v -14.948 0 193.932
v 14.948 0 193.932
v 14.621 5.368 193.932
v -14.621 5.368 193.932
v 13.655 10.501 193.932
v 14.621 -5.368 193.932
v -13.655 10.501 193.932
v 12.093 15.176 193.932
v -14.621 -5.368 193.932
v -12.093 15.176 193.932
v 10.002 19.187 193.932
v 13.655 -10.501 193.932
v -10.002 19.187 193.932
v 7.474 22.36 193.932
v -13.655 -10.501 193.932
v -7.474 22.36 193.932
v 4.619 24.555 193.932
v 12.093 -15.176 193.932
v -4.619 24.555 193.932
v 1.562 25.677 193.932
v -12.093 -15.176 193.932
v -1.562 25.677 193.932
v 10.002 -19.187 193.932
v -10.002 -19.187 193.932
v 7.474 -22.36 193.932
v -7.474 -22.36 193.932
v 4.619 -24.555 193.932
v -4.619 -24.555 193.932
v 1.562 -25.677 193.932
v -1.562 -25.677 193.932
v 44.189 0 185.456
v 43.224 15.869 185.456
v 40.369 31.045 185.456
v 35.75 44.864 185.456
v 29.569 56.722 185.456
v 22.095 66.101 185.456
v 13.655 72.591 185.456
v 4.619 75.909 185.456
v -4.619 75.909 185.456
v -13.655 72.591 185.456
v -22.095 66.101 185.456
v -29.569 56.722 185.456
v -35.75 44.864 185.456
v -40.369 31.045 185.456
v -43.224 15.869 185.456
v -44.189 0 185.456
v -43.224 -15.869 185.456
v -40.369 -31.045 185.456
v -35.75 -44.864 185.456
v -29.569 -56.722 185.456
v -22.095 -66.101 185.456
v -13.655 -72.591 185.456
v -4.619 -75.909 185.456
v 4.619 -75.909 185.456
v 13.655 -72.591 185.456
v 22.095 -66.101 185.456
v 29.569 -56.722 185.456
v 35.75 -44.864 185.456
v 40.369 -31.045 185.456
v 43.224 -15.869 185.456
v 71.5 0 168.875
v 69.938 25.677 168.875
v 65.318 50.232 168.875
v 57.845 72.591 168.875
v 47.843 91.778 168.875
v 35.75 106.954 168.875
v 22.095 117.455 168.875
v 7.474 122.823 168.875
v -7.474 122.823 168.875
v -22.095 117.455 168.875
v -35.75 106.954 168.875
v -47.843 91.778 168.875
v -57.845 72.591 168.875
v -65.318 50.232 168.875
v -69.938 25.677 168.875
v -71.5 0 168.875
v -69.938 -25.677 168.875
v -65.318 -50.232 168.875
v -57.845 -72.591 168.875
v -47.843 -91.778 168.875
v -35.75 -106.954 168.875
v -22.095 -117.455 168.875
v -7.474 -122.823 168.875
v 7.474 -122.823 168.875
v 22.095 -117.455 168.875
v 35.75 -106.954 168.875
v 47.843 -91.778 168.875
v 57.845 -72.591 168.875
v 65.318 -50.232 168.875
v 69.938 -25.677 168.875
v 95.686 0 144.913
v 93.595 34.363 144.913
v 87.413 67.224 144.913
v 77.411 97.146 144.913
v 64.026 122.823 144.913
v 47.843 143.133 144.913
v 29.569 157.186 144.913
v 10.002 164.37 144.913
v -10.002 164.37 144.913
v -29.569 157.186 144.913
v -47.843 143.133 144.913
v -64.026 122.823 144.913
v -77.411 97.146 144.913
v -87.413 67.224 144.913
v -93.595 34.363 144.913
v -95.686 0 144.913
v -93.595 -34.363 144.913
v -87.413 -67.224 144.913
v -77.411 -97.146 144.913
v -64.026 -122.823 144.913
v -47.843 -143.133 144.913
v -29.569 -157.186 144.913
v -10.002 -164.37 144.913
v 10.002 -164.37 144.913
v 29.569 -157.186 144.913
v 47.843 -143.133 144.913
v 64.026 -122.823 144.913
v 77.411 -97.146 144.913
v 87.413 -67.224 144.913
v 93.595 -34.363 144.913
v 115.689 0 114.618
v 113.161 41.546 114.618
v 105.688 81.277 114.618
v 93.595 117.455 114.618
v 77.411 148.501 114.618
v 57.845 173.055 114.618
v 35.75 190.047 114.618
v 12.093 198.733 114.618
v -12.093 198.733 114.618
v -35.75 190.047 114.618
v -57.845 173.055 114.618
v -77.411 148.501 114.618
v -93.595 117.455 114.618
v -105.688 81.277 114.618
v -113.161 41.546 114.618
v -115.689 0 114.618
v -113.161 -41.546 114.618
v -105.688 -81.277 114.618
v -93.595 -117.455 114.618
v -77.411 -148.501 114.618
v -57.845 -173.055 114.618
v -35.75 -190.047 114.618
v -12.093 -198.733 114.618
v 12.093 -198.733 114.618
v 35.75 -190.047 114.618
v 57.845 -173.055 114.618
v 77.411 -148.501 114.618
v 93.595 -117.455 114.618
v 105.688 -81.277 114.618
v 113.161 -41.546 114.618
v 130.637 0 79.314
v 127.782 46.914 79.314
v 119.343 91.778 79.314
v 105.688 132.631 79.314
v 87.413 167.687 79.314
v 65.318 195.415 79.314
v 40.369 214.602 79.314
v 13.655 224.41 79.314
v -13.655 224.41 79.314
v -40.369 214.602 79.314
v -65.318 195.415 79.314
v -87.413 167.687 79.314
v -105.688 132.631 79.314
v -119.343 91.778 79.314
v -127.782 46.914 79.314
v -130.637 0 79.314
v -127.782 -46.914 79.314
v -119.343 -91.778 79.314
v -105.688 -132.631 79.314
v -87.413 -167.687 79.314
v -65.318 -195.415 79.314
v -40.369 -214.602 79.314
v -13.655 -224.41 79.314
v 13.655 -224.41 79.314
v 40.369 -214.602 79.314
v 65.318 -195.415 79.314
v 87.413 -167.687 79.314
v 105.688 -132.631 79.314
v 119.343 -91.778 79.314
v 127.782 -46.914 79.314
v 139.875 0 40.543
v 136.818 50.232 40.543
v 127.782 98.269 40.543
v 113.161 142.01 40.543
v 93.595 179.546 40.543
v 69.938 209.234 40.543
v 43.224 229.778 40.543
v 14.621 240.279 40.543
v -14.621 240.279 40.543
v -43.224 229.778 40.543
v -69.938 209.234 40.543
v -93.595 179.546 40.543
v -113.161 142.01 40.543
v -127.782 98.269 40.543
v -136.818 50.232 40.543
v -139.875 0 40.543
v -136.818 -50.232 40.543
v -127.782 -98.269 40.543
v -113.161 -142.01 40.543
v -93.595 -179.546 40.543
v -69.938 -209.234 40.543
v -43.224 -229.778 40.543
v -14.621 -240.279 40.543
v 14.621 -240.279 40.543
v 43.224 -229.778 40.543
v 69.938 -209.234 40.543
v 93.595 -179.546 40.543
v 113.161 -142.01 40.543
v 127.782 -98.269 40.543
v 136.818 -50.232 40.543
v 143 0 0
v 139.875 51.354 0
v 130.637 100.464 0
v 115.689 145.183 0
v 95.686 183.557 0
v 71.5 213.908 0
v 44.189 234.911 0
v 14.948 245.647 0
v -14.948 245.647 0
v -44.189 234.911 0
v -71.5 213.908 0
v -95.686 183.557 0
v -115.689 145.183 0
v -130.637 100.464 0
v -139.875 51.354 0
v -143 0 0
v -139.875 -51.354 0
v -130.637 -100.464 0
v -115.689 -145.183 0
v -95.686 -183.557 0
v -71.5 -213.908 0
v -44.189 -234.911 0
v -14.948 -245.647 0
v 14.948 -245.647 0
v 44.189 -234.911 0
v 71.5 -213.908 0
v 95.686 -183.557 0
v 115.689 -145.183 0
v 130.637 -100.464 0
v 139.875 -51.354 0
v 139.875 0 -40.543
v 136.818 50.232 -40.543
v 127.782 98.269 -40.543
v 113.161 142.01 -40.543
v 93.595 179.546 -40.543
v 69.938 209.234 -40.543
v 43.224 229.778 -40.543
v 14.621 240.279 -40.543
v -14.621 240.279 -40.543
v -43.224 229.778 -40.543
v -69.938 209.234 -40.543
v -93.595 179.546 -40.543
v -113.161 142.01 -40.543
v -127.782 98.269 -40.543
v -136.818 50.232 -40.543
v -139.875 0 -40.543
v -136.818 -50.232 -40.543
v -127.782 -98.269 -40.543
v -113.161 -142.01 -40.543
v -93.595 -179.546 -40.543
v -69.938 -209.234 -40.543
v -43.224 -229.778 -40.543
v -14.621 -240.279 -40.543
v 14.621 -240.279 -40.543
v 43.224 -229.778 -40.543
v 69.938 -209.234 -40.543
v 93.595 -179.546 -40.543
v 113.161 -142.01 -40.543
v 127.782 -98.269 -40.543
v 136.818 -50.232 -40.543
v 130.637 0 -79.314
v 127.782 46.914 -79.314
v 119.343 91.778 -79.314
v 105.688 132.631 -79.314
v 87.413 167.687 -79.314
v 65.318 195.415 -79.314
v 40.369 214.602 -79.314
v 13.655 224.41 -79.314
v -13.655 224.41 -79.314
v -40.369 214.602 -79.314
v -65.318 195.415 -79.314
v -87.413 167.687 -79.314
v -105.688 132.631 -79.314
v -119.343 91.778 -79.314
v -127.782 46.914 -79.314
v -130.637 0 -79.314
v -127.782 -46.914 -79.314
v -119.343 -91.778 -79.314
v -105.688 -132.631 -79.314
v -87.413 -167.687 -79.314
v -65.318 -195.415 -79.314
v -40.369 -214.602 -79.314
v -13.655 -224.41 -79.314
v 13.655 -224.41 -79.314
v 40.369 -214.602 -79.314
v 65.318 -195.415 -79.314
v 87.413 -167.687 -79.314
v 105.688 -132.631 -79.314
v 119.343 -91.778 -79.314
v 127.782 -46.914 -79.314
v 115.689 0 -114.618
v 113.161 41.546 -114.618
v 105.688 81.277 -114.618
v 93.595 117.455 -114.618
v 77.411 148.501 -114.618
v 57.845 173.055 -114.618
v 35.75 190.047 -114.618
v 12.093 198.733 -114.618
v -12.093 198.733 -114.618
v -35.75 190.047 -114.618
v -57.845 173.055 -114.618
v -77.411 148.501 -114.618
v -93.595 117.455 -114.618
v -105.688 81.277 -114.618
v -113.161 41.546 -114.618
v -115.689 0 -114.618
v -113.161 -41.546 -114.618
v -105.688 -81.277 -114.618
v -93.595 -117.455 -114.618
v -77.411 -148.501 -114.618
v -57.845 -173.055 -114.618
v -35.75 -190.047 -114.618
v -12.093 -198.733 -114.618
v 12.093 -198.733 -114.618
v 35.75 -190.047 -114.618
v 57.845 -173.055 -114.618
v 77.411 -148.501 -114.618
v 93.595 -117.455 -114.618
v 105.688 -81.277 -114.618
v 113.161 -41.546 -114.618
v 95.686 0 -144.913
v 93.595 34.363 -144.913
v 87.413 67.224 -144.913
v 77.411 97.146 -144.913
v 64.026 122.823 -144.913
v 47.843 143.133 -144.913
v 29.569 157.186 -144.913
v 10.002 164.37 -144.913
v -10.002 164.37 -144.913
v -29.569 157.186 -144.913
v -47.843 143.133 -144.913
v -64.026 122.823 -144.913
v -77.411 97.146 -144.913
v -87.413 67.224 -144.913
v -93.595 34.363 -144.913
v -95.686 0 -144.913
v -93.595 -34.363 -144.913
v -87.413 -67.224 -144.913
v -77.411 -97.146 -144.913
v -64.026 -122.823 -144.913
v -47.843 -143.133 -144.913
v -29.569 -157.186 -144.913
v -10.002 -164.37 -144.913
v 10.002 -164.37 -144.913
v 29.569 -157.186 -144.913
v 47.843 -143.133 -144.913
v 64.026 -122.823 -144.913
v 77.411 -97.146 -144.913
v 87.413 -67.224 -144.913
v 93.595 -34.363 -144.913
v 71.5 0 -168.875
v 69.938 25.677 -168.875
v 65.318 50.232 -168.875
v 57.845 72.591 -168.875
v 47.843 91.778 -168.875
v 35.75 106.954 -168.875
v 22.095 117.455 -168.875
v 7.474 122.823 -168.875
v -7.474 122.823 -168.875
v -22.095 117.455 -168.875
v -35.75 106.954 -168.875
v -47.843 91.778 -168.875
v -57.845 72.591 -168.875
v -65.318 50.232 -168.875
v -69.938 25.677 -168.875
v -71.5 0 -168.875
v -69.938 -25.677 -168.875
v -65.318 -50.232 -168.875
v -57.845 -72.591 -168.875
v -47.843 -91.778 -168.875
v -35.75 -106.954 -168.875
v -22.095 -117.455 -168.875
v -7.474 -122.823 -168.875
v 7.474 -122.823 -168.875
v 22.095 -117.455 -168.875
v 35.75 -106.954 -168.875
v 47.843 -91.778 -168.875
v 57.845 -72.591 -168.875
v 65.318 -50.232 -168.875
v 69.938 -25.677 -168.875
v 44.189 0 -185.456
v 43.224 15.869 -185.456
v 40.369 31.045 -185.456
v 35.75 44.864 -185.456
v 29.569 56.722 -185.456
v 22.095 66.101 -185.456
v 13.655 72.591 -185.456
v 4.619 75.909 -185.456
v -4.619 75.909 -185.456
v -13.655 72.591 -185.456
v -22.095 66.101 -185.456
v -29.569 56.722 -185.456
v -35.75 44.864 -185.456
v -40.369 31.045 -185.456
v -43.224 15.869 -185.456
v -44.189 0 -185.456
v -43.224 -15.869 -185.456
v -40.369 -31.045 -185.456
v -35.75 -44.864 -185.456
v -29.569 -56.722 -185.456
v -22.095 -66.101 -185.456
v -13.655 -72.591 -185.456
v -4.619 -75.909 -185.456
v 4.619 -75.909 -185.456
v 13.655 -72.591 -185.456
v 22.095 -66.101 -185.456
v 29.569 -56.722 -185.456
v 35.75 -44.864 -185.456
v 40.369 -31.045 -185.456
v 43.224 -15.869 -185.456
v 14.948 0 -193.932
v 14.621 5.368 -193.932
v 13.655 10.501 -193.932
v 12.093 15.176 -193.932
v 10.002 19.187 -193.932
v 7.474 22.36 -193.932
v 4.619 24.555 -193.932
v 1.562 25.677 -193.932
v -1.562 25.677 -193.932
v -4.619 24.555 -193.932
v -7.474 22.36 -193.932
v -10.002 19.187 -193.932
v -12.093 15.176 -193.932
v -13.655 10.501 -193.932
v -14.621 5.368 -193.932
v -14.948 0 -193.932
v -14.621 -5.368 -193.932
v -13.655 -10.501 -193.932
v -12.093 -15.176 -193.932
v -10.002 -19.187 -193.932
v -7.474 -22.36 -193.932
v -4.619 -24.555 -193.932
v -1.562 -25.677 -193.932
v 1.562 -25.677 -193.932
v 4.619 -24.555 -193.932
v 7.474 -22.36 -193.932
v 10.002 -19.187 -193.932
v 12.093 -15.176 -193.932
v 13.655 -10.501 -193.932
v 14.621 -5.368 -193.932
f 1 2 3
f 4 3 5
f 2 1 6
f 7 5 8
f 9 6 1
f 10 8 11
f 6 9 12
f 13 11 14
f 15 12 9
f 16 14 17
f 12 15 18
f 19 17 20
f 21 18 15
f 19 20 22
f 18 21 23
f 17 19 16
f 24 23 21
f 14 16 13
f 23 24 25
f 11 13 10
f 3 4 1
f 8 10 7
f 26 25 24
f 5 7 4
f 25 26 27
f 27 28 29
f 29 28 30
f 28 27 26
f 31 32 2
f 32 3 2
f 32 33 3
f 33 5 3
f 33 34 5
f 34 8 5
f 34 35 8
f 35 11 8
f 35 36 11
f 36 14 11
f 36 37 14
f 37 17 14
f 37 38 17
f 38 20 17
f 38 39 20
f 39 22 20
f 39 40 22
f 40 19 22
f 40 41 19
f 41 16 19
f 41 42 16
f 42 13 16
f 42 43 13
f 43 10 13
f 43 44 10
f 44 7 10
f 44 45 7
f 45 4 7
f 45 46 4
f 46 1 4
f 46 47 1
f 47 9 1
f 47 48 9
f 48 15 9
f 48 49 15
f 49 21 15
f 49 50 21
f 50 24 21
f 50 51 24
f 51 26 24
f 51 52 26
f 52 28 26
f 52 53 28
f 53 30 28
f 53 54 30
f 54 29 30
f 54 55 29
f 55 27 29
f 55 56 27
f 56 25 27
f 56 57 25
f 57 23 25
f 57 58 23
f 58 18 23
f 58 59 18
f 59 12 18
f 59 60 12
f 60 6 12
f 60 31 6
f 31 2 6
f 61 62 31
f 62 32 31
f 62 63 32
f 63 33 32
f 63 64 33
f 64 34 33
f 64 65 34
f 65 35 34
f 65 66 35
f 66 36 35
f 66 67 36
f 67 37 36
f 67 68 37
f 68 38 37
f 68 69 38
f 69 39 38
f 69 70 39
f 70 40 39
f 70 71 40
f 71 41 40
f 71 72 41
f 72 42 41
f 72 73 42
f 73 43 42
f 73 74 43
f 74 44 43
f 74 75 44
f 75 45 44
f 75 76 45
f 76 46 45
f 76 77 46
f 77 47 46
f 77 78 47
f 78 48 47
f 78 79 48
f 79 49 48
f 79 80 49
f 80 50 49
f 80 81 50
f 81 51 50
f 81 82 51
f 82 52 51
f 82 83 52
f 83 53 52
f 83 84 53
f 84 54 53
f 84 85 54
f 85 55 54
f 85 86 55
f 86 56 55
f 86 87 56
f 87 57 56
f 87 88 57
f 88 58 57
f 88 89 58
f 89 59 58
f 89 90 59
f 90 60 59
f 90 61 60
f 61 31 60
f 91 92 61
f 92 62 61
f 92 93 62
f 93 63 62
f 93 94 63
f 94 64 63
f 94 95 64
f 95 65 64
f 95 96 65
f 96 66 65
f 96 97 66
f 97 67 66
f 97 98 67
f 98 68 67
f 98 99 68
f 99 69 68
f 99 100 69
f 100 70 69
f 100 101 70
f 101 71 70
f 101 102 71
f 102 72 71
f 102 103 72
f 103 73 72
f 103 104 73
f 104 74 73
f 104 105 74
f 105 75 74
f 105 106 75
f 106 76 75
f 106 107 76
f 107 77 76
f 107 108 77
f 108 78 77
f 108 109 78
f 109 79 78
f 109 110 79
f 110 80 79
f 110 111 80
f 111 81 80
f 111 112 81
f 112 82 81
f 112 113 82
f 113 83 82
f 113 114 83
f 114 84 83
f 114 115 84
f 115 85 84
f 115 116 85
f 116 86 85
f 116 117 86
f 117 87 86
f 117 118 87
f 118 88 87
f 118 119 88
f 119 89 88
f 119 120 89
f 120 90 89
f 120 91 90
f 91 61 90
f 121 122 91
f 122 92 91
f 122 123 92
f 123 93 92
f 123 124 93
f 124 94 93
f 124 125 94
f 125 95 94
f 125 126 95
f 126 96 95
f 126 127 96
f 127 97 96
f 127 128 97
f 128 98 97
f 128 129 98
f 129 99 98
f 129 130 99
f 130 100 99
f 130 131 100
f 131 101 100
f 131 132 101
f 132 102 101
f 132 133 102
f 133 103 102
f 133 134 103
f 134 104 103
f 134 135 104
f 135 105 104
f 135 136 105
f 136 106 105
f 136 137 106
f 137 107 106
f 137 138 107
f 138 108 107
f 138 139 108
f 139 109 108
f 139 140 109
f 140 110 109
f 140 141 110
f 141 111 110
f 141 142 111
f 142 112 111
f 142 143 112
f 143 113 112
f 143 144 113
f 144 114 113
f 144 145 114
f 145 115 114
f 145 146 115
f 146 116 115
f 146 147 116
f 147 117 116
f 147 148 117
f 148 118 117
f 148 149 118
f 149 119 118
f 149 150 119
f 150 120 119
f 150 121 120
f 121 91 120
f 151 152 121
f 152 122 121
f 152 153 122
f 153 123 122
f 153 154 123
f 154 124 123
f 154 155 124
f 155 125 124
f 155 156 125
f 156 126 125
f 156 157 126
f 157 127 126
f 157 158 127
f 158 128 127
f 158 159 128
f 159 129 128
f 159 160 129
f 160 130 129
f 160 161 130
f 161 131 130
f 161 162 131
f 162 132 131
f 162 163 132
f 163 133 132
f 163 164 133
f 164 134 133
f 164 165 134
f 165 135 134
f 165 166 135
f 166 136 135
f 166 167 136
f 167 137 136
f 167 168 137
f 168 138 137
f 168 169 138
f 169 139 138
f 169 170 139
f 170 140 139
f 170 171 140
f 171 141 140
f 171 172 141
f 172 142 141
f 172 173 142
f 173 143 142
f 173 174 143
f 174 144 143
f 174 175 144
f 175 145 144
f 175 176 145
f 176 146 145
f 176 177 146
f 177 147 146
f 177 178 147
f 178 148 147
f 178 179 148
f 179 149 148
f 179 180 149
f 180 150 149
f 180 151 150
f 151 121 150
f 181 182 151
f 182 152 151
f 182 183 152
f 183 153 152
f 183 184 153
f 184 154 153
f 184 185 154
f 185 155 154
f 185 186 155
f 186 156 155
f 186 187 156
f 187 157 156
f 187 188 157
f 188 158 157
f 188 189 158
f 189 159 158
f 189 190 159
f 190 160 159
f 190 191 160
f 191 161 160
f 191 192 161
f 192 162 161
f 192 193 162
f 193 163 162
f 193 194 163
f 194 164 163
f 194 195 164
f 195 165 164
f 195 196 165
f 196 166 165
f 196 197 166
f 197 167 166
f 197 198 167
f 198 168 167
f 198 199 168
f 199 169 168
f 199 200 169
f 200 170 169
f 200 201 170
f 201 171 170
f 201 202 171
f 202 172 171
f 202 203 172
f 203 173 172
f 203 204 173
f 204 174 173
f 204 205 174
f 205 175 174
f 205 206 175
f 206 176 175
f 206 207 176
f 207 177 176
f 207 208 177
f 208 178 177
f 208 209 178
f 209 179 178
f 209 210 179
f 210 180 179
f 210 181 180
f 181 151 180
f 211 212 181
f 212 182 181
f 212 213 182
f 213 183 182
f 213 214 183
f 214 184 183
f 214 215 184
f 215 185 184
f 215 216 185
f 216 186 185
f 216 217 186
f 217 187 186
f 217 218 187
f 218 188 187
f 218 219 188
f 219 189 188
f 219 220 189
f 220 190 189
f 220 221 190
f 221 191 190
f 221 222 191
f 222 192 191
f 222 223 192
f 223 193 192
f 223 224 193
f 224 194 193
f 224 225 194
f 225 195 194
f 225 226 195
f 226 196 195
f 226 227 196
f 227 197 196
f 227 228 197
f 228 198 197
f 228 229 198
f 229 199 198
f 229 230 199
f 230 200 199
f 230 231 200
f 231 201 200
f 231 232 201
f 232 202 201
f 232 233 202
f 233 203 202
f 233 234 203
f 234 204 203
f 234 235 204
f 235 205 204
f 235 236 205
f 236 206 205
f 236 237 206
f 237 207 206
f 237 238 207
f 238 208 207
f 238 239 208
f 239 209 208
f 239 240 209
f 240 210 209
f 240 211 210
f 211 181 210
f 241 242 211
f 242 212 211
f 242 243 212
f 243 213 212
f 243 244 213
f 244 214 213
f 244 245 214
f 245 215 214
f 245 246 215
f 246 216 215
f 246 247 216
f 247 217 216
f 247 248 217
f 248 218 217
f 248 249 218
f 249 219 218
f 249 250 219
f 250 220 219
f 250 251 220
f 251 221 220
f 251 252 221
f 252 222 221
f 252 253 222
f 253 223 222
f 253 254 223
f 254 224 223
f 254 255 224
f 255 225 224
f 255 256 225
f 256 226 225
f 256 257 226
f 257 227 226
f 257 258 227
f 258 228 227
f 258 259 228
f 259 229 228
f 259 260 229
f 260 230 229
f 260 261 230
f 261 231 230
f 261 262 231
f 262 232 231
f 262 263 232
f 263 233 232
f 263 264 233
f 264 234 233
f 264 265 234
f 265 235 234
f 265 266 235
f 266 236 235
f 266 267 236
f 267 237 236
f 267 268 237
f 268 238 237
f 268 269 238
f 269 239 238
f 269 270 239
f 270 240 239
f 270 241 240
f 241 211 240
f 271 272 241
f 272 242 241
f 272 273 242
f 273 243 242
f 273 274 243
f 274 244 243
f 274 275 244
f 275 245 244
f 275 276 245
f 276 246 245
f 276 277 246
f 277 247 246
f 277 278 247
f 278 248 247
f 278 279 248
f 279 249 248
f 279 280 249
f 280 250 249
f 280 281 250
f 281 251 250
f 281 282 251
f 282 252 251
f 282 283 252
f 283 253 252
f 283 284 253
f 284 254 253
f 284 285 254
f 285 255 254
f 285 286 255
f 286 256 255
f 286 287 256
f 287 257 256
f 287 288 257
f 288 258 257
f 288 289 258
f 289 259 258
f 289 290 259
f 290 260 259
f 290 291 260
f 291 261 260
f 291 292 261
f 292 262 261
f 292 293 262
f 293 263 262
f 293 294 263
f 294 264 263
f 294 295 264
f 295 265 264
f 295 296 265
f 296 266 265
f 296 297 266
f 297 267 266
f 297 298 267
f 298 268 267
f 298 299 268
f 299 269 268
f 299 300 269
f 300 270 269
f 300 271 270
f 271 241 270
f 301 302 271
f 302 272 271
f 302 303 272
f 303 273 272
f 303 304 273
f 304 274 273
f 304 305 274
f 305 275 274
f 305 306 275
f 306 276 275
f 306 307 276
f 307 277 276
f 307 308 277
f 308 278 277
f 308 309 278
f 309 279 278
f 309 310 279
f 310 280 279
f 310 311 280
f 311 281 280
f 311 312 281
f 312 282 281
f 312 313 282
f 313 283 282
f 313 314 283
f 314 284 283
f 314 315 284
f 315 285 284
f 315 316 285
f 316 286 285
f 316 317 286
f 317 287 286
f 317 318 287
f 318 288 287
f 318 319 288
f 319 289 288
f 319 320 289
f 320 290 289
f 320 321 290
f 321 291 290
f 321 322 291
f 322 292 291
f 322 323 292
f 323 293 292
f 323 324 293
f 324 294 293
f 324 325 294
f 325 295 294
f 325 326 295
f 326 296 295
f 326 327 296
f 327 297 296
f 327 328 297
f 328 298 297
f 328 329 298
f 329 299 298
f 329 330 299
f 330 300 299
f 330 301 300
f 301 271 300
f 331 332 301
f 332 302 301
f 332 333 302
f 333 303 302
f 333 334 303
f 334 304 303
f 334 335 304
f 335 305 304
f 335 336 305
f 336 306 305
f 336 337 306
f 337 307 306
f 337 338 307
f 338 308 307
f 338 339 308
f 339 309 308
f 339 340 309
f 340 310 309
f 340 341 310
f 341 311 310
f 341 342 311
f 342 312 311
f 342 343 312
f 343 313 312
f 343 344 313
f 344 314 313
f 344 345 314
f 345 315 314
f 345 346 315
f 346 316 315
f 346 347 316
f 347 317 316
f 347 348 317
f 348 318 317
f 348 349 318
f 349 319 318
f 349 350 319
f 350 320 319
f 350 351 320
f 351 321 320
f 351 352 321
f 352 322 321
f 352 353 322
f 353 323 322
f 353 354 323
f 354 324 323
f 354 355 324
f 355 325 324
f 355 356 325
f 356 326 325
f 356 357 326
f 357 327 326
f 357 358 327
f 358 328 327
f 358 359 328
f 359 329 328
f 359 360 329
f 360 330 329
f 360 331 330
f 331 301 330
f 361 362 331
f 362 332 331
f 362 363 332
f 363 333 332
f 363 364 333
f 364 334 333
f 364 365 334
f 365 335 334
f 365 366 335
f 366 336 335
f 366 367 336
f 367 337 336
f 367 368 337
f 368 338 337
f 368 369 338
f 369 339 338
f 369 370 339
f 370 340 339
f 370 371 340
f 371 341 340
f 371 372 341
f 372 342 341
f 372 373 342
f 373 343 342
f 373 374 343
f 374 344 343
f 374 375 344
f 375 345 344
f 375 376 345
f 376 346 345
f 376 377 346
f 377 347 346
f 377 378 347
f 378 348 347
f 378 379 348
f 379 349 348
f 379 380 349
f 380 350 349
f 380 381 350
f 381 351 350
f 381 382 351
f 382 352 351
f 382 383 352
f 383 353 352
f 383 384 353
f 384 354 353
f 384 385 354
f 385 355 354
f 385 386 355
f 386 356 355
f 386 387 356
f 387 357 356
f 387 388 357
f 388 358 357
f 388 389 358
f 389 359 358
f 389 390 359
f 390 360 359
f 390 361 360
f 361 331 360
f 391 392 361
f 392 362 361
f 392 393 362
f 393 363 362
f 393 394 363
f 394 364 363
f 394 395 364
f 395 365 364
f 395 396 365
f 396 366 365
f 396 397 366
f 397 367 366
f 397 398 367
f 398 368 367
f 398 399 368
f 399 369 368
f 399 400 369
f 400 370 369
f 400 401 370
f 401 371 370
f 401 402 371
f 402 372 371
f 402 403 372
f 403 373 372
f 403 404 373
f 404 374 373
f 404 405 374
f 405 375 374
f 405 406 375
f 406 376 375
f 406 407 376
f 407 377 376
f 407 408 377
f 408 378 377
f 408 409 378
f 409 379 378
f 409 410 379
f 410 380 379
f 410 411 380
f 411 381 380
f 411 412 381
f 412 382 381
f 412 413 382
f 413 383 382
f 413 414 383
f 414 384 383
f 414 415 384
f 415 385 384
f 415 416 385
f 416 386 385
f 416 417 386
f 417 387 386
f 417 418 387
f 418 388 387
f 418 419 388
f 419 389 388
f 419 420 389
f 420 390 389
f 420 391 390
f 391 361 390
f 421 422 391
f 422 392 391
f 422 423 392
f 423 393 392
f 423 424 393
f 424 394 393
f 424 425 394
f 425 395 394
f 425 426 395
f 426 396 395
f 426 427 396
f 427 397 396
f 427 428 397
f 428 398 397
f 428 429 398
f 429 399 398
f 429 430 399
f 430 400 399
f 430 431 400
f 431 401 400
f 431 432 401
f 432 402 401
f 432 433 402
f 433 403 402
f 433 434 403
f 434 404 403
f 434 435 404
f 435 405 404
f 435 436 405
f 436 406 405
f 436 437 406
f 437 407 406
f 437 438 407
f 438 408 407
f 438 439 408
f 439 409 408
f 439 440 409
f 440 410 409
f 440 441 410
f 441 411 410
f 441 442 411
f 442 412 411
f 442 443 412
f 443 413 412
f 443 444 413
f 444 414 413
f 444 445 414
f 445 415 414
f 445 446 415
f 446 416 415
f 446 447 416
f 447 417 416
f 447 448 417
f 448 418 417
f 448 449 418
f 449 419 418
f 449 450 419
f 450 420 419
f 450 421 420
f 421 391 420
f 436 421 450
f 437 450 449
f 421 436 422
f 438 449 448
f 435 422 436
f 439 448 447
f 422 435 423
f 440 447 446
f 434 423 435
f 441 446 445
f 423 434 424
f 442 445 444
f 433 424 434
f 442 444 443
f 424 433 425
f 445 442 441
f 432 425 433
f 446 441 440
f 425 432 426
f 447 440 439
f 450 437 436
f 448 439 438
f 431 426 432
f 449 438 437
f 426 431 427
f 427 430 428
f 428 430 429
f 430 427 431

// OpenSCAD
// Generated by SolidPython 1.0.1 on 2020-07-29 00:46:50


scale(v = [11, 19, 15]) {
	sphere(r = 13);
}
/***********************************************
*********      SolidPython code:      **********
************************************************
 
# import packages: SolidPython
from solid import *
from solid.utils import *
from itertools import chain, combinations, permutations


class Resize:

    def __init__(self, scad_file):
        self.scad_file = scad_file
        #self.scad_file = import_scad(scad_file)
        # cone/cylinder param:
        self.r1 = 0
        self.r2 = 0
        self.h = 0
        # rectangular prism param:
        self.w = 0
        self.l = 0
        # ellipse param:
        self.r = 0

    # import OpenScad code (file name corresponds to shape)


    # classify shape + parameters
    def assign(self, param1, param2, param3):
        if self.scad_file == 'cone.scad':
            self.r1 = param1
            self.r2 = param2
            self.h = param3
        elif self.scad_file == 'cylinder.scad':
            self.r1 = param1
            self.r2 = param2
            self.h = param3
        elif self.scad_file == 'rectangularPrism.scad':
            self.h = param1
            self.l = param2
            self.w = param3
        else:
            self.r = param1
            self.h = param2

    # resize parameters
    def iterate(self):
        x = range(3, 20, 2)
        i = 1
        if self.scad_file == 'cone.scad':
            tempList = list(permutations(x, 2))
            for temp in tempList:
                param1 = temp[0]
                param2 = temp[1]
                filepath = 'produced_scad_files/' + 'cone' + str(param1) + '_' + str(param2) + '_' + '.scad'
                scad_render_to_file(cylinder(h=param1, r1=param2, r2=0), filepath)

        elif self.scad_file == 'cylinder.scad':
            tempList = list(permutations(x, 3))
            for temp in tempList:
                param1 = temp[0]
                param2 = temp[1]
                filepath = 'produced_scad_files/' + 'cylinder' + str(param1) + '_' + str(param2) + '_' + '.scad'
                scad_render_to_file(cylinder(h=param1, r1=param2, r2=param2), filepath)

        elif self.scad_file == 'rectangularPrism.scad':
            tempList = list(permutations(x, 3))
            for temp in tempList:
                param1 = temp[0]
                param2 = temp[1]
                param3 = temp[2]
                filepath = 'produced_scad_files/' + 'rectangularPrism' + str(param1) + '_' + str(param2) + '_' + str(
                    param3) + '.scad'
                scad_render_to_file(cube(size=(param1, param2, param3)), filepath)

        elif self.scad_file == 'ellipse.scad':
            tempList = list(permutations(x, 4))
            for temp in tempList:
                param1 = temp[0]
                param2 = temp[1]
                param3 = temp[2]
                param4 = temp[3]
                filepath = 'produced_scad_files/' + 'ellipse' + str(param1) + '_' + str(param2) + '_' + str(param3) + '_' + str(param4) + '.scad'
                scad_render_to_file(scale([param1, param2, param3])(sphere(r=param4)), filepath)

    def render_to_scadfile(self):
        scad_render_to_file(scad, 'example.scad') 
 
************************************************/
